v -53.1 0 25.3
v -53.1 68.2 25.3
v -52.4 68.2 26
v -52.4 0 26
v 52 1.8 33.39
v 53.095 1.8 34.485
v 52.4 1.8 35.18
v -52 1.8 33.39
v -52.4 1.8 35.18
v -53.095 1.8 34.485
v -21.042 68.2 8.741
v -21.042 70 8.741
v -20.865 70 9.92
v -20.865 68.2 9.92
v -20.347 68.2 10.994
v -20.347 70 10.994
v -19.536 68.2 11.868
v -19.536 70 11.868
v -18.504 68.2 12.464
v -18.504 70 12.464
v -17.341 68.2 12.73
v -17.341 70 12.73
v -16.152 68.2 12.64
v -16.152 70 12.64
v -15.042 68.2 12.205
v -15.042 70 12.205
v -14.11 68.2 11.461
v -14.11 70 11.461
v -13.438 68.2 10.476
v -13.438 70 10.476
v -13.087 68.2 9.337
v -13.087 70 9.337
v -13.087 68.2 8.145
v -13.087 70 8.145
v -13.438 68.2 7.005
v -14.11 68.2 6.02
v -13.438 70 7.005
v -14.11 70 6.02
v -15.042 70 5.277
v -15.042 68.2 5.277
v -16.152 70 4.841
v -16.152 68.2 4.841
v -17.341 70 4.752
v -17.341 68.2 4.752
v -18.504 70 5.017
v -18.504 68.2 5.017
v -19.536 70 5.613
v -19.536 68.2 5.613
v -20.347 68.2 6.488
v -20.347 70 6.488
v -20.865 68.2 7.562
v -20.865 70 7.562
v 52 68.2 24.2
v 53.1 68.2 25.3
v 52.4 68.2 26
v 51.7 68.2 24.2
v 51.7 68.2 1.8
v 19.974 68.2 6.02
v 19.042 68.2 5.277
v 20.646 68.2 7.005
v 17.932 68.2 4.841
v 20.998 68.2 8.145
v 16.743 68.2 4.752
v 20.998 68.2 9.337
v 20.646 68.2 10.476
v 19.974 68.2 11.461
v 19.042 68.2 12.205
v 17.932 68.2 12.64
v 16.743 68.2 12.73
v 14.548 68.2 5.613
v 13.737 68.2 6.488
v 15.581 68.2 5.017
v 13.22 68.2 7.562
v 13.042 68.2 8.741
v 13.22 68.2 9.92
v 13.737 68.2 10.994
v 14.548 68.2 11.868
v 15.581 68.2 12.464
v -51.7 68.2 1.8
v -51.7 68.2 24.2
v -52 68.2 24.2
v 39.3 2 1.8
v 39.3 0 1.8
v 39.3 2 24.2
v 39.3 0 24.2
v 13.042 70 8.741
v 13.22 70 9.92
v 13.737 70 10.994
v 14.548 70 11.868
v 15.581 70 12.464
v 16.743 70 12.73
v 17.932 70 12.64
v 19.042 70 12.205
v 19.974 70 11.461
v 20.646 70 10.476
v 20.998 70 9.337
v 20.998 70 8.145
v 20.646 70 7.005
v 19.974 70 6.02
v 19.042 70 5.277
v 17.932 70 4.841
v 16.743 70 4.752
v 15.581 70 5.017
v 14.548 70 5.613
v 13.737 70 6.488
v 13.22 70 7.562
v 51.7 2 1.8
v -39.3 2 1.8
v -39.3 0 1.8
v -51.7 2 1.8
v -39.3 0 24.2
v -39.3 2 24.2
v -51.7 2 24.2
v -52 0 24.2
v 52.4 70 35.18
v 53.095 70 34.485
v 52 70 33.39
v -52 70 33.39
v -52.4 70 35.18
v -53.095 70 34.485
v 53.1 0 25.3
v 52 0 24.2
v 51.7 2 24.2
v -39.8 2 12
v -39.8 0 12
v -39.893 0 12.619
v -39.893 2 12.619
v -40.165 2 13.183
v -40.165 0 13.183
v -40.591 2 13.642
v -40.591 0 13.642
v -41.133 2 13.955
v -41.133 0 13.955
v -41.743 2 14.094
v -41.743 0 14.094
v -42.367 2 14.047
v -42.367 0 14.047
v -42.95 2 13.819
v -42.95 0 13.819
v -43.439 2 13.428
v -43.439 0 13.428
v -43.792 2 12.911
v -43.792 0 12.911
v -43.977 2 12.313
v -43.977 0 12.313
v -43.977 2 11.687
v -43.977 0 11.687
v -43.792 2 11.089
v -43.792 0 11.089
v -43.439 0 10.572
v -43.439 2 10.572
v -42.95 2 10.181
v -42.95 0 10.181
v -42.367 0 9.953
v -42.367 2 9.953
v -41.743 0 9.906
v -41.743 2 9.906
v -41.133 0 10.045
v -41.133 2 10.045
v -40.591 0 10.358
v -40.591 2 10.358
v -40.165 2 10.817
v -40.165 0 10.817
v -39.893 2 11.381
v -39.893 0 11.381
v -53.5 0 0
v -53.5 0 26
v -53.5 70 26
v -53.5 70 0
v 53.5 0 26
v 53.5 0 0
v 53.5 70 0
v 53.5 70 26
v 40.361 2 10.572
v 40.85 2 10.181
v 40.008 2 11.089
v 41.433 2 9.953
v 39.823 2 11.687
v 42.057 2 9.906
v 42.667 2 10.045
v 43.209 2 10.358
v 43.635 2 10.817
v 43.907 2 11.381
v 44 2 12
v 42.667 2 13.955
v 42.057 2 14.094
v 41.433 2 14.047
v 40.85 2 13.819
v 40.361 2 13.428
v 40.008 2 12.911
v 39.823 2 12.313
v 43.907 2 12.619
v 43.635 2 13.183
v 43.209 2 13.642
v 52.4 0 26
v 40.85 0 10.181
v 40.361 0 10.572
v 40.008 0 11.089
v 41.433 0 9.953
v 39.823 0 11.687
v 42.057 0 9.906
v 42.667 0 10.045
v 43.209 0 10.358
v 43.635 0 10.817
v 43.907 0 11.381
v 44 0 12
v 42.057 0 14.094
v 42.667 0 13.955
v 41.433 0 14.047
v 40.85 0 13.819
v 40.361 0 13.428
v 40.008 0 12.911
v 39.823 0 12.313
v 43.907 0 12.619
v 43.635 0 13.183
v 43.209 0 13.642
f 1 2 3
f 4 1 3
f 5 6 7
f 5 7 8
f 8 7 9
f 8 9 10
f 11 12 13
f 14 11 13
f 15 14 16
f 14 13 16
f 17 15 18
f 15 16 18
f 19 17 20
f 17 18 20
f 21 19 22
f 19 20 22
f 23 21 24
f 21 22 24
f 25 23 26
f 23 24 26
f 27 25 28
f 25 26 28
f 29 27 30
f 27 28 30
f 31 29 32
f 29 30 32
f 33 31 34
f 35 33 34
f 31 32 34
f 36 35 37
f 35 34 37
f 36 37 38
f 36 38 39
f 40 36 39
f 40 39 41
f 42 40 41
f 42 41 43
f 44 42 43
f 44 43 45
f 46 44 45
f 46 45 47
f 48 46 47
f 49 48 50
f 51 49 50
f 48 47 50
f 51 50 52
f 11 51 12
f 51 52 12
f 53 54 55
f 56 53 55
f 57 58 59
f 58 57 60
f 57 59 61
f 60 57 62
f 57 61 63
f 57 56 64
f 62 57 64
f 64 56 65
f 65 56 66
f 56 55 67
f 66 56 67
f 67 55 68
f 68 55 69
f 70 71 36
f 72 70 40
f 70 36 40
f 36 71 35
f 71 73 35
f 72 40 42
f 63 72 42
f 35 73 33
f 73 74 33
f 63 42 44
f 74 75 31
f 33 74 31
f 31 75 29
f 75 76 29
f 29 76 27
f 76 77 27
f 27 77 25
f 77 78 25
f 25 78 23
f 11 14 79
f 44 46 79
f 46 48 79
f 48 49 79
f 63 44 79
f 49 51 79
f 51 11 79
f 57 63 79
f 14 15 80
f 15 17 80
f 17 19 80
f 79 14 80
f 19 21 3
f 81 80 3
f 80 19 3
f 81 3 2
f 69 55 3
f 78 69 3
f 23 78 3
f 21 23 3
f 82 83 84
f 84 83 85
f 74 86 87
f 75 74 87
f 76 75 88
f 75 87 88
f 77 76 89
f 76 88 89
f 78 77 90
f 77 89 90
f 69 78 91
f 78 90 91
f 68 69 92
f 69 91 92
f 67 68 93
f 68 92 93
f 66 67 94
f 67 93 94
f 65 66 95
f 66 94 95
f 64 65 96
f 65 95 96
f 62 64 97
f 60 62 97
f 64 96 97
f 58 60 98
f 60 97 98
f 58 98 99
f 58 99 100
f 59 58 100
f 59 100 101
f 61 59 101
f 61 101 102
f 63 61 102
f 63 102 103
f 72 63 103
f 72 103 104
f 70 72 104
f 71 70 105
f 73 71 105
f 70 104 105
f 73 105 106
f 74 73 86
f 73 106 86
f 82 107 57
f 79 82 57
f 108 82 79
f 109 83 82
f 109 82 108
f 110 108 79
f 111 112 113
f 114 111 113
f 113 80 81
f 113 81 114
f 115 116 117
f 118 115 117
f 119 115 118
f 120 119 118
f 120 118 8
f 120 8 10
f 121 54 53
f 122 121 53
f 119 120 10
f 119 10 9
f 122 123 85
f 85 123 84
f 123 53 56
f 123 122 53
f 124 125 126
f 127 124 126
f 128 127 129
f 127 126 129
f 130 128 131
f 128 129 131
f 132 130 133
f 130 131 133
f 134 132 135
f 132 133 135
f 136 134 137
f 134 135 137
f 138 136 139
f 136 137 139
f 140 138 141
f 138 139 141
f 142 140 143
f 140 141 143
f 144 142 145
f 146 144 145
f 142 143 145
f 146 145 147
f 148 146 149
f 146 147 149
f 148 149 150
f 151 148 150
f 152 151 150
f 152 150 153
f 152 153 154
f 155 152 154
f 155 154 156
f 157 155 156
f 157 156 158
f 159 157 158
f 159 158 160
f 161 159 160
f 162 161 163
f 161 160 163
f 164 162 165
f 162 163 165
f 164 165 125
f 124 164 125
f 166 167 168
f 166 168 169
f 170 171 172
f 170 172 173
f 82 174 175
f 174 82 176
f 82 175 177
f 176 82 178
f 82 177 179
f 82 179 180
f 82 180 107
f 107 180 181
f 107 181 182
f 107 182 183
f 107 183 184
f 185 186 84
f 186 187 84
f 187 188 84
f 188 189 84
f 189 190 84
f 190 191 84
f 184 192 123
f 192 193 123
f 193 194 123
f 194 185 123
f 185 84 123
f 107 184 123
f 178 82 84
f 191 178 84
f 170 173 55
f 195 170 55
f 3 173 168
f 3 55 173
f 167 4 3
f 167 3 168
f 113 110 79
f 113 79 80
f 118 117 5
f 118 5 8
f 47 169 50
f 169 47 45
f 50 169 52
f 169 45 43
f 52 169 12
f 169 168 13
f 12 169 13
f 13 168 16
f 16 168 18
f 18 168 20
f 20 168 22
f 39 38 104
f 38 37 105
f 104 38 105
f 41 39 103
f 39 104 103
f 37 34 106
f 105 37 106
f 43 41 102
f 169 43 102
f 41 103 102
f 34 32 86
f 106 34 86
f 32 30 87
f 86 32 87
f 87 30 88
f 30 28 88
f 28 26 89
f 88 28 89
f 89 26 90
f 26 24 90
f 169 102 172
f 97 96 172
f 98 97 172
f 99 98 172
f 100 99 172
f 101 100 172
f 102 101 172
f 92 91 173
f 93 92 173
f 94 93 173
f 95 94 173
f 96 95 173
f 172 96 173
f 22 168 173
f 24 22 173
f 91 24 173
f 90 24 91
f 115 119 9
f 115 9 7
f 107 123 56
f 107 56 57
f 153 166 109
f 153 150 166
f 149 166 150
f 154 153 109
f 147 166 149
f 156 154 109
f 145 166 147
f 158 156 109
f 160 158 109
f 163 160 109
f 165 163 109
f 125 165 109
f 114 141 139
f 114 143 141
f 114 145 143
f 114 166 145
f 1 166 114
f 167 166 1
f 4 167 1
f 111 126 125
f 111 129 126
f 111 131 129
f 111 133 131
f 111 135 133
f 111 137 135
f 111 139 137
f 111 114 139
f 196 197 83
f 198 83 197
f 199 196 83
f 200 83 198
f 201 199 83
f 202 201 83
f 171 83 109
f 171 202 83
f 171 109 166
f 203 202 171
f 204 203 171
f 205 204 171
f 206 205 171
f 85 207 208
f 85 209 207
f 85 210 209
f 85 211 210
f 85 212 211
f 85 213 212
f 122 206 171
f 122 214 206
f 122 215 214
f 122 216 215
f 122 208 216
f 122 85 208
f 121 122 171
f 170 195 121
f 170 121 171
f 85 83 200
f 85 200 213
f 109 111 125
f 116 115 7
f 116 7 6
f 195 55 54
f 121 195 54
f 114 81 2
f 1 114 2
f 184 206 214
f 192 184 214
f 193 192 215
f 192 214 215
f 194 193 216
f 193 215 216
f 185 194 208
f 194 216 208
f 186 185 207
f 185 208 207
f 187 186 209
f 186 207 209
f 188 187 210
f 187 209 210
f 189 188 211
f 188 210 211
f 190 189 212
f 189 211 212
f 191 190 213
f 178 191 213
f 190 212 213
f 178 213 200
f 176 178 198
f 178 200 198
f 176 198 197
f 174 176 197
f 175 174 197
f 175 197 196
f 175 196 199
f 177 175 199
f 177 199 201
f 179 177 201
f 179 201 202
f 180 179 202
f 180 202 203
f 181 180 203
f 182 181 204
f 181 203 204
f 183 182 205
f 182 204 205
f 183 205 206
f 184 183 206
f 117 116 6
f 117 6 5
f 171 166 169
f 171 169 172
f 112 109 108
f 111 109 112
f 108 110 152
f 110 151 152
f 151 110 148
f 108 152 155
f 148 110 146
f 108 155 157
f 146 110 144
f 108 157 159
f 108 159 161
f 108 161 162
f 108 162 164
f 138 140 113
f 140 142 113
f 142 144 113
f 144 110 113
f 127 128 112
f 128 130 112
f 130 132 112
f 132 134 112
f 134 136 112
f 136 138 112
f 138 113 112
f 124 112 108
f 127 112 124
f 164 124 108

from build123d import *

# Parameters (mm, degrees)
F1_DEPTH = 70
F0_W     = 12.4
F0_H     = 22.4
F0_R     = 2.1
F2_DEPTH = 2
F5_DEPTH = 70
F6_DEPTH = 68.2
F7_R     = 4
F8_DEPTH = 1.8


with BuildPart() as f1:
    # F0 (on Front) → F1 (new body)
    with BuildSketch(Plane.XZ):
        Polygon((-53.5, 0), (-39.3, 0), (-39.3, 1.8), (-51.7, 1.8), (-51.7, 24.2), (-39.3, 24.2), (-39.3, 26), (-53.5, 26), align=None)
        Polygon((0, 24.2), (39.3, 24.2), (39.3, 26), (0, 26), (-39.3, 26), (-39.3, 24.2), align=None)
        Polygon((-39.3, 0), (0, 0), (39.3, 0), (39.3, 1.8), (0, 1.8), (-39.3, 1.8), align=None)
        Polygon((39.3, 1.8), (39.3, 0), (53.5, 0), (53.5, 26), (39.3, 26), (39.3, 24.2), (51.7, 24.2), (51.7, 1.8), align=None)
    extrude(amount=-F1_DEPTH)

    # F0 (on Front) → F2 (join)
    with BuildSketch(Plane.XZ):
        with Locations((45.5, 13)):
            Rectangle(F0_W, F0_H)
        with Locations((41.9, 12)):
            Circle(F0_R, mode=Mode.SUBTRACT)
        with Locations((-45.5, 13)):
            Rectangle(F0_W, F0_H)
        with Locations((-41.9, 12)):
            Circle(F0_R, mode=Mode.SUBTRACT)
    extrude(amount=-F2_DEPTH)

    # F4 (on offset) → F5 (cut)
    with BuildSketch(Plane(origin=(0, 70, 0), x_dir=(-1, 0, 0), z_dir=(0, 1, 0))):
        Polygon((52.4, 26), (0, 26), (-52.4, 26), (-53.1, 25.3), (-52, 24.2), (0, 24.2), (52, 24.2), (53.1, 25.3), align=None)
    extrude(amount=-F5_DEPTH, mode=Mode.SUBTRACT)

    # F7 (on face) → F8 (join)
    with BuildSketch(Plane(origin=(0, 70, 0), x_dir=(-1, 0, 0), z_dir=(0, 1, 0))):
        Polygon((-51.7, 1.8), (0, 1.8), (51.7, 1.8), (51.7, 23.8758921623), (51.7, 24.2), (51.7, 26), (0, 26), (-51.7, 26), (-51.7, 24.2), (-51.7, 23.8758921623), align=None)
        with Locations((-17.0422233641, 8.7407846004)):
            Circle(F7_R, mode=Mode.SUBTRACT)
        with Locations((17.0422233641, 8.7407846004)):
            Circle(F7_R, mode=Mode.SUBTRACT)
        Polygon((51.7, 1.8), (0, 1.8), (-51.7, 1.8), (-51.7, 23.8758921623), (-53.5, 23.8758921623), (-53.5, 0), (53.5, 0), (53.5, 23.8758921623), (51.7, 23.8758921623), align=None)
        Polygon((51.7, 24.2), (51.7, 23.8758921623), (53.5, 23.8758921623), (53.5, 26), (52.4, 26), (53.1, 25.3), (52, 24.2), align=None)
        Polygon((-53.5, 23.8758921623), (-51.7, 23.8758921623), (-51.7, 24.2), (-52, 24.2), (-53.1, 25.3), (-52.4, 26), (-53.5, 26), align=None)
        Polygon((51.7, 26), (51.7, 24.2), (52, 24.2), (53.1, 25.3), (52.4, 26), align=None)
        Polygon((-52, 24.2), (-51.7, 24.2), (-51.7, 26), (-52.4, 26), (-53.1, 25.3), align=None)
    extrude(amount=-F8_DEPTH)


with BuildPart() as f6:
    # F4 (on offset) → F6 (new body)
    with BuildSketch(Plane(origin=(0, 70, 0), x_dir=(-1, 0, 0), z_dir=(0, 1, 0))):
        Polygon((-52, 33.38964656), (0, 33.38964656), (52, 33.38964656), (53.095, 34.48464656), (52.4, 35.17964656), (0, 35.17964656), (-52.4, 35.17964656), (-53.095, 34.48464656), align=None)
    extrude(amount=-F6_DEPTH)


solid = Compound([f1.part, f6.part])
